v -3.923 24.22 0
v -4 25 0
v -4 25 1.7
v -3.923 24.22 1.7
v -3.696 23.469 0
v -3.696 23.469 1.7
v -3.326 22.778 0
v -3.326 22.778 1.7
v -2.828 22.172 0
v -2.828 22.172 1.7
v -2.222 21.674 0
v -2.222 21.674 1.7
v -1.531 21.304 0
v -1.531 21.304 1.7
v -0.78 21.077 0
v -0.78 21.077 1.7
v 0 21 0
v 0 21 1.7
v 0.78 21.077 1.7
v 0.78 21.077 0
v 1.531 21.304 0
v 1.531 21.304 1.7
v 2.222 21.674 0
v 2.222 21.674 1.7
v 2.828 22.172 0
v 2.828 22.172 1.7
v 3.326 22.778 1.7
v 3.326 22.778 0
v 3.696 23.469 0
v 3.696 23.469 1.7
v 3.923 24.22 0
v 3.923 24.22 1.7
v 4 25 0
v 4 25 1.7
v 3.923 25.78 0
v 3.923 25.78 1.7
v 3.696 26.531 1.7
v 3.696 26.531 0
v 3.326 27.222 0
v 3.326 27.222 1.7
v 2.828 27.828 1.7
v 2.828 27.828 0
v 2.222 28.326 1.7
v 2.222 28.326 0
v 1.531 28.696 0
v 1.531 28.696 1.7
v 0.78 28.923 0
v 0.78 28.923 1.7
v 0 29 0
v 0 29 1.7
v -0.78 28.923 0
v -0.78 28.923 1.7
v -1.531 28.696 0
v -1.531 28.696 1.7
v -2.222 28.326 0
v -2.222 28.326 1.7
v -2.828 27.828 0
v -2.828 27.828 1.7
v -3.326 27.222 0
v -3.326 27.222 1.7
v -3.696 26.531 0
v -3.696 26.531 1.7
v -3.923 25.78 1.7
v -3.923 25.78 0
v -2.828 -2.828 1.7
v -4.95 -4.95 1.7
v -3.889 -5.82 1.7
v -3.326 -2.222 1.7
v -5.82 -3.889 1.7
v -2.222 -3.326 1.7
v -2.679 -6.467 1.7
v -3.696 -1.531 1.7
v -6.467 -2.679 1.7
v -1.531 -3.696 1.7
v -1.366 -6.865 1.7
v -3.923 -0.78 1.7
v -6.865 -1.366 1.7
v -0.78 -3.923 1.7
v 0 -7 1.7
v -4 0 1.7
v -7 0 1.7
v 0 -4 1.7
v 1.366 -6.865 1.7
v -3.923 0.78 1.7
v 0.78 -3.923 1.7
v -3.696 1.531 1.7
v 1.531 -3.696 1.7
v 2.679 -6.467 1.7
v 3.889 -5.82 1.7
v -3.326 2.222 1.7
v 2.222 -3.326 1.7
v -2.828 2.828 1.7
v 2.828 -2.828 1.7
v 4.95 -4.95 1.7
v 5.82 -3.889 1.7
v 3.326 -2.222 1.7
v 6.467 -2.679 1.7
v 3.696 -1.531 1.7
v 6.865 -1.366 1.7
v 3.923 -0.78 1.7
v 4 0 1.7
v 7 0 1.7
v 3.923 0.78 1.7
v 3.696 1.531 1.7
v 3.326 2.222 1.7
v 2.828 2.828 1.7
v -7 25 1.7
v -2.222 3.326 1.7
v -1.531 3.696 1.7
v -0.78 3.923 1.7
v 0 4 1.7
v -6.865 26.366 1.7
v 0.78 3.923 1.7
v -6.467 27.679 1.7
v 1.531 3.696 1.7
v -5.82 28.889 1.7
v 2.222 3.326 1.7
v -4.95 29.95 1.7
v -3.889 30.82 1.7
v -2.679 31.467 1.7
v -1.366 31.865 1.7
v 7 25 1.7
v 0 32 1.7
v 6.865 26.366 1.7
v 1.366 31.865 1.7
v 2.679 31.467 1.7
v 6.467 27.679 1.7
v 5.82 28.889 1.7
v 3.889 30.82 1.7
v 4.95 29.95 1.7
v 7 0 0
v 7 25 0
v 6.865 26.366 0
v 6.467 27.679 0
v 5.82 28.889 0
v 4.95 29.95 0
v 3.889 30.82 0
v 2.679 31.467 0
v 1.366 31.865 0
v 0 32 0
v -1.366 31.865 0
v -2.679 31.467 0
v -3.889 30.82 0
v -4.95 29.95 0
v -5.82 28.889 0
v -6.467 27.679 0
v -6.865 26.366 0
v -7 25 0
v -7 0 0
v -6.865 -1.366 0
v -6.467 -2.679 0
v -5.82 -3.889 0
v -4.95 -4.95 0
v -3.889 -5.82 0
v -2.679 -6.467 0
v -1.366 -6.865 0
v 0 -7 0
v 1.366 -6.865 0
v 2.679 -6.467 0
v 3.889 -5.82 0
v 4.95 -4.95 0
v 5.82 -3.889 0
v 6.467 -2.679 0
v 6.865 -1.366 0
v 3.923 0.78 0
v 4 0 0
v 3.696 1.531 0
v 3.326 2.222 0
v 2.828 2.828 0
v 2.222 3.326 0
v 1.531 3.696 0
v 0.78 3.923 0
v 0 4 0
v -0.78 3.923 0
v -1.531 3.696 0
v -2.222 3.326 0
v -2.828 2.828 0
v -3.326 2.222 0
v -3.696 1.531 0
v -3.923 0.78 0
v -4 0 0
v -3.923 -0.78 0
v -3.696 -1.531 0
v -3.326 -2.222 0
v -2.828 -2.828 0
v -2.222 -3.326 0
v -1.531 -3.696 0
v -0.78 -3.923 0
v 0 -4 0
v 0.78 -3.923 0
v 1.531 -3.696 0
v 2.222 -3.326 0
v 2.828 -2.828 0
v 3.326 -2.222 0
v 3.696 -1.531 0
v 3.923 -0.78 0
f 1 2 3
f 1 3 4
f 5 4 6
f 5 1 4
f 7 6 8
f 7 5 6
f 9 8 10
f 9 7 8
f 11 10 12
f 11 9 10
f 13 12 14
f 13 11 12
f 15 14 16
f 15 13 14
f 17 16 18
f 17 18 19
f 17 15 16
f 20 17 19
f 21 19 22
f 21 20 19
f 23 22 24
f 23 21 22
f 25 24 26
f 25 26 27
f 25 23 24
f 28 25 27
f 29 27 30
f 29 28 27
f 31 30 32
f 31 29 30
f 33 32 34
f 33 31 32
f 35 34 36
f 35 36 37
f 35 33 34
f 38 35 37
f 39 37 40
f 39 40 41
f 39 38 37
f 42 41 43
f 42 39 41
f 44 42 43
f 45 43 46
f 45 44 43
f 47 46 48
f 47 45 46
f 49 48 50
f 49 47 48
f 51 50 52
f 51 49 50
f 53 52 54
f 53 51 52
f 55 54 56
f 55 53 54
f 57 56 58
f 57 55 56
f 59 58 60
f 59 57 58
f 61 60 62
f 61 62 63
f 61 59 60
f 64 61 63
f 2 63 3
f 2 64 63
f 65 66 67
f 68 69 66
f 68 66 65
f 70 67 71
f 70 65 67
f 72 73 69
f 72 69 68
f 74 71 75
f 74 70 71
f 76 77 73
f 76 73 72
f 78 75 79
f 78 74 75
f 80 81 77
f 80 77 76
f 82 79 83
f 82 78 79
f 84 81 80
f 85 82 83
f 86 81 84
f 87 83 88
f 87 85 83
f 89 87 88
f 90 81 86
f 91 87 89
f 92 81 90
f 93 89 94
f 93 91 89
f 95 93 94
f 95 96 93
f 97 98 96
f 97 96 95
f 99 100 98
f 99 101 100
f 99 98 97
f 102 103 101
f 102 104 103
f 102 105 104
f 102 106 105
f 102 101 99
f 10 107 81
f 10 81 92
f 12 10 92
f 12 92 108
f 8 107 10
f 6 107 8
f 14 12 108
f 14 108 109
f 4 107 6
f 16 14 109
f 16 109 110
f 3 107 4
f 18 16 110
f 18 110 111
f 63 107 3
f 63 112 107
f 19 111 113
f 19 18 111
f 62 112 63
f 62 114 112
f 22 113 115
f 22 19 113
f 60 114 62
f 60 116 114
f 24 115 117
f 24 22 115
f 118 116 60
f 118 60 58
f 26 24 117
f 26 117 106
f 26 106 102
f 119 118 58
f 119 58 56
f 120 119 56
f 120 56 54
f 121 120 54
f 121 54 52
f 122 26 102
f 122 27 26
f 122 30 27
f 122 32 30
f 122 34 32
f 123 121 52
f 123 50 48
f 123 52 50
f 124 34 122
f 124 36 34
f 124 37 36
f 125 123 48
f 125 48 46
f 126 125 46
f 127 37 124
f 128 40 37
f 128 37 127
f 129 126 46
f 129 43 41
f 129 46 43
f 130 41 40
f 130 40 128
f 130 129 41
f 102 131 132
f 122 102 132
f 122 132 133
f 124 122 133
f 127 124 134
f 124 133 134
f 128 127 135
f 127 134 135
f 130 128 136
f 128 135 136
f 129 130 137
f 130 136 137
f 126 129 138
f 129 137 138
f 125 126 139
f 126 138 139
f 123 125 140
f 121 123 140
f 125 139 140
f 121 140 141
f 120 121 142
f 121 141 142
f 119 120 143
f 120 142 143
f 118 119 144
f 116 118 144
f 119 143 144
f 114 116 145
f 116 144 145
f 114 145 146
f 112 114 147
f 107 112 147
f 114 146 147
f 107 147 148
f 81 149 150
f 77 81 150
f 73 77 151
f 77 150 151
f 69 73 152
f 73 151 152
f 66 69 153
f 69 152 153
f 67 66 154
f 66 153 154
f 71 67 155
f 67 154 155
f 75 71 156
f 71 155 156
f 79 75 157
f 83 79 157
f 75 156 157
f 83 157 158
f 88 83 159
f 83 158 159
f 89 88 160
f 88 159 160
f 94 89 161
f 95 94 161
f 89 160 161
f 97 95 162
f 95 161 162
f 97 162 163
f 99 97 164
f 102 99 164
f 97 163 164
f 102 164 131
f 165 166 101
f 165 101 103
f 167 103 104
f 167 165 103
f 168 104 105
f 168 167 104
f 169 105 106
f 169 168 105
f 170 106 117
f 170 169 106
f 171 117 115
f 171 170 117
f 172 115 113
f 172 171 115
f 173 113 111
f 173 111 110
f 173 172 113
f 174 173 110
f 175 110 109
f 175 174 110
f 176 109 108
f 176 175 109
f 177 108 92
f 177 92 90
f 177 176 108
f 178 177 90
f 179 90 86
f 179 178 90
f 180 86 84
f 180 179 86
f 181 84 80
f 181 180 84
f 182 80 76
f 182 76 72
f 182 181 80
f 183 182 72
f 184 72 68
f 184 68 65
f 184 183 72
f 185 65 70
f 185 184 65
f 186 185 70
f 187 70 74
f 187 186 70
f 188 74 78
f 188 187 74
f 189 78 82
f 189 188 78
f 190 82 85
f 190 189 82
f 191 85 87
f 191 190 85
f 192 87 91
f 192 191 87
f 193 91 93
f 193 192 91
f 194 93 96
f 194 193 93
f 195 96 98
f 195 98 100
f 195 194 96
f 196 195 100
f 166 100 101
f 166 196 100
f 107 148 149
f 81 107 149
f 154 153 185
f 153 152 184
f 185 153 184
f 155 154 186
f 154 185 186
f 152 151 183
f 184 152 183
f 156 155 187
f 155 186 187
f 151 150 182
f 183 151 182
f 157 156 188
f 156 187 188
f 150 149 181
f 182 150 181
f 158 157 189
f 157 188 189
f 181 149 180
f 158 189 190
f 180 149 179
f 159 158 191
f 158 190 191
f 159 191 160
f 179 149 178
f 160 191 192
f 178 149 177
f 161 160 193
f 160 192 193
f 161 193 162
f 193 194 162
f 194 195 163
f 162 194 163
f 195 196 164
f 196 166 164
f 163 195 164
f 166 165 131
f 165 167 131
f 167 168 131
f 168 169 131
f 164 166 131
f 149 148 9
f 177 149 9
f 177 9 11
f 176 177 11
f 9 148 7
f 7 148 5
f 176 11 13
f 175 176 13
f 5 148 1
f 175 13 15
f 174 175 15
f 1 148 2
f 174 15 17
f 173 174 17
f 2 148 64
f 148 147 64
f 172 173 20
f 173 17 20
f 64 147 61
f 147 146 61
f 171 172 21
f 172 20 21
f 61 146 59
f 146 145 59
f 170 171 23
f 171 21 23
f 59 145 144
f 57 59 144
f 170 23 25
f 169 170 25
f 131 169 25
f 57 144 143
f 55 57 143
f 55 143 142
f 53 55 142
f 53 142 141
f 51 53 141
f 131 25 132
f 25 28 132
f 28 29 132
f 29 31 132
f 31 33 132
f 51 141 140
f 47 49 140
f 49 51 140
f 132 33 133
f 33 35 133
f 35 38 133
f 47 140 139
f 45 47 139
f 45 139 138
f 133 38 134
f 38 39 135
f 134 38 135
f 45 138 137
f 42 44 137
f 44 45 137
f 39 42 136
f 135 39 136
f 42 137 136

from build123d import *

# Parameters (mm, degrees)
CROQUIS1_R              = 4
SALIENTE_EXTRUIR1_DEPTH = 1.7


with BuildPart() as part:
    # Croquis1 → Saliente-Extruir1 (new body)
    with BuildSketch(Plane.XY):
        with BuildLine():
            Line((-7, 25), (-7, 0))
            ThreePointArc((-7, 0), (0, -7), (7, 0))
            Line((7, 0), (7, 25))
            ThreePointArc((7, 25), (0, 32), (-7, 25))
        make_face()
        Circle(CROQUIS1_R, mode=Mode.SUBTRACT)
        with BuildLine():
            ThreePointArc((4, 25), (0, 29), (-4, 25))
            ThreePointArc((-4, 25), (0, 21), (4, 25))
        make_face(mode=Mode.SUBTRACT)
    extrude(amount=SALIENTE_EXTRUIR1_DEPTH)


solid = part.part
